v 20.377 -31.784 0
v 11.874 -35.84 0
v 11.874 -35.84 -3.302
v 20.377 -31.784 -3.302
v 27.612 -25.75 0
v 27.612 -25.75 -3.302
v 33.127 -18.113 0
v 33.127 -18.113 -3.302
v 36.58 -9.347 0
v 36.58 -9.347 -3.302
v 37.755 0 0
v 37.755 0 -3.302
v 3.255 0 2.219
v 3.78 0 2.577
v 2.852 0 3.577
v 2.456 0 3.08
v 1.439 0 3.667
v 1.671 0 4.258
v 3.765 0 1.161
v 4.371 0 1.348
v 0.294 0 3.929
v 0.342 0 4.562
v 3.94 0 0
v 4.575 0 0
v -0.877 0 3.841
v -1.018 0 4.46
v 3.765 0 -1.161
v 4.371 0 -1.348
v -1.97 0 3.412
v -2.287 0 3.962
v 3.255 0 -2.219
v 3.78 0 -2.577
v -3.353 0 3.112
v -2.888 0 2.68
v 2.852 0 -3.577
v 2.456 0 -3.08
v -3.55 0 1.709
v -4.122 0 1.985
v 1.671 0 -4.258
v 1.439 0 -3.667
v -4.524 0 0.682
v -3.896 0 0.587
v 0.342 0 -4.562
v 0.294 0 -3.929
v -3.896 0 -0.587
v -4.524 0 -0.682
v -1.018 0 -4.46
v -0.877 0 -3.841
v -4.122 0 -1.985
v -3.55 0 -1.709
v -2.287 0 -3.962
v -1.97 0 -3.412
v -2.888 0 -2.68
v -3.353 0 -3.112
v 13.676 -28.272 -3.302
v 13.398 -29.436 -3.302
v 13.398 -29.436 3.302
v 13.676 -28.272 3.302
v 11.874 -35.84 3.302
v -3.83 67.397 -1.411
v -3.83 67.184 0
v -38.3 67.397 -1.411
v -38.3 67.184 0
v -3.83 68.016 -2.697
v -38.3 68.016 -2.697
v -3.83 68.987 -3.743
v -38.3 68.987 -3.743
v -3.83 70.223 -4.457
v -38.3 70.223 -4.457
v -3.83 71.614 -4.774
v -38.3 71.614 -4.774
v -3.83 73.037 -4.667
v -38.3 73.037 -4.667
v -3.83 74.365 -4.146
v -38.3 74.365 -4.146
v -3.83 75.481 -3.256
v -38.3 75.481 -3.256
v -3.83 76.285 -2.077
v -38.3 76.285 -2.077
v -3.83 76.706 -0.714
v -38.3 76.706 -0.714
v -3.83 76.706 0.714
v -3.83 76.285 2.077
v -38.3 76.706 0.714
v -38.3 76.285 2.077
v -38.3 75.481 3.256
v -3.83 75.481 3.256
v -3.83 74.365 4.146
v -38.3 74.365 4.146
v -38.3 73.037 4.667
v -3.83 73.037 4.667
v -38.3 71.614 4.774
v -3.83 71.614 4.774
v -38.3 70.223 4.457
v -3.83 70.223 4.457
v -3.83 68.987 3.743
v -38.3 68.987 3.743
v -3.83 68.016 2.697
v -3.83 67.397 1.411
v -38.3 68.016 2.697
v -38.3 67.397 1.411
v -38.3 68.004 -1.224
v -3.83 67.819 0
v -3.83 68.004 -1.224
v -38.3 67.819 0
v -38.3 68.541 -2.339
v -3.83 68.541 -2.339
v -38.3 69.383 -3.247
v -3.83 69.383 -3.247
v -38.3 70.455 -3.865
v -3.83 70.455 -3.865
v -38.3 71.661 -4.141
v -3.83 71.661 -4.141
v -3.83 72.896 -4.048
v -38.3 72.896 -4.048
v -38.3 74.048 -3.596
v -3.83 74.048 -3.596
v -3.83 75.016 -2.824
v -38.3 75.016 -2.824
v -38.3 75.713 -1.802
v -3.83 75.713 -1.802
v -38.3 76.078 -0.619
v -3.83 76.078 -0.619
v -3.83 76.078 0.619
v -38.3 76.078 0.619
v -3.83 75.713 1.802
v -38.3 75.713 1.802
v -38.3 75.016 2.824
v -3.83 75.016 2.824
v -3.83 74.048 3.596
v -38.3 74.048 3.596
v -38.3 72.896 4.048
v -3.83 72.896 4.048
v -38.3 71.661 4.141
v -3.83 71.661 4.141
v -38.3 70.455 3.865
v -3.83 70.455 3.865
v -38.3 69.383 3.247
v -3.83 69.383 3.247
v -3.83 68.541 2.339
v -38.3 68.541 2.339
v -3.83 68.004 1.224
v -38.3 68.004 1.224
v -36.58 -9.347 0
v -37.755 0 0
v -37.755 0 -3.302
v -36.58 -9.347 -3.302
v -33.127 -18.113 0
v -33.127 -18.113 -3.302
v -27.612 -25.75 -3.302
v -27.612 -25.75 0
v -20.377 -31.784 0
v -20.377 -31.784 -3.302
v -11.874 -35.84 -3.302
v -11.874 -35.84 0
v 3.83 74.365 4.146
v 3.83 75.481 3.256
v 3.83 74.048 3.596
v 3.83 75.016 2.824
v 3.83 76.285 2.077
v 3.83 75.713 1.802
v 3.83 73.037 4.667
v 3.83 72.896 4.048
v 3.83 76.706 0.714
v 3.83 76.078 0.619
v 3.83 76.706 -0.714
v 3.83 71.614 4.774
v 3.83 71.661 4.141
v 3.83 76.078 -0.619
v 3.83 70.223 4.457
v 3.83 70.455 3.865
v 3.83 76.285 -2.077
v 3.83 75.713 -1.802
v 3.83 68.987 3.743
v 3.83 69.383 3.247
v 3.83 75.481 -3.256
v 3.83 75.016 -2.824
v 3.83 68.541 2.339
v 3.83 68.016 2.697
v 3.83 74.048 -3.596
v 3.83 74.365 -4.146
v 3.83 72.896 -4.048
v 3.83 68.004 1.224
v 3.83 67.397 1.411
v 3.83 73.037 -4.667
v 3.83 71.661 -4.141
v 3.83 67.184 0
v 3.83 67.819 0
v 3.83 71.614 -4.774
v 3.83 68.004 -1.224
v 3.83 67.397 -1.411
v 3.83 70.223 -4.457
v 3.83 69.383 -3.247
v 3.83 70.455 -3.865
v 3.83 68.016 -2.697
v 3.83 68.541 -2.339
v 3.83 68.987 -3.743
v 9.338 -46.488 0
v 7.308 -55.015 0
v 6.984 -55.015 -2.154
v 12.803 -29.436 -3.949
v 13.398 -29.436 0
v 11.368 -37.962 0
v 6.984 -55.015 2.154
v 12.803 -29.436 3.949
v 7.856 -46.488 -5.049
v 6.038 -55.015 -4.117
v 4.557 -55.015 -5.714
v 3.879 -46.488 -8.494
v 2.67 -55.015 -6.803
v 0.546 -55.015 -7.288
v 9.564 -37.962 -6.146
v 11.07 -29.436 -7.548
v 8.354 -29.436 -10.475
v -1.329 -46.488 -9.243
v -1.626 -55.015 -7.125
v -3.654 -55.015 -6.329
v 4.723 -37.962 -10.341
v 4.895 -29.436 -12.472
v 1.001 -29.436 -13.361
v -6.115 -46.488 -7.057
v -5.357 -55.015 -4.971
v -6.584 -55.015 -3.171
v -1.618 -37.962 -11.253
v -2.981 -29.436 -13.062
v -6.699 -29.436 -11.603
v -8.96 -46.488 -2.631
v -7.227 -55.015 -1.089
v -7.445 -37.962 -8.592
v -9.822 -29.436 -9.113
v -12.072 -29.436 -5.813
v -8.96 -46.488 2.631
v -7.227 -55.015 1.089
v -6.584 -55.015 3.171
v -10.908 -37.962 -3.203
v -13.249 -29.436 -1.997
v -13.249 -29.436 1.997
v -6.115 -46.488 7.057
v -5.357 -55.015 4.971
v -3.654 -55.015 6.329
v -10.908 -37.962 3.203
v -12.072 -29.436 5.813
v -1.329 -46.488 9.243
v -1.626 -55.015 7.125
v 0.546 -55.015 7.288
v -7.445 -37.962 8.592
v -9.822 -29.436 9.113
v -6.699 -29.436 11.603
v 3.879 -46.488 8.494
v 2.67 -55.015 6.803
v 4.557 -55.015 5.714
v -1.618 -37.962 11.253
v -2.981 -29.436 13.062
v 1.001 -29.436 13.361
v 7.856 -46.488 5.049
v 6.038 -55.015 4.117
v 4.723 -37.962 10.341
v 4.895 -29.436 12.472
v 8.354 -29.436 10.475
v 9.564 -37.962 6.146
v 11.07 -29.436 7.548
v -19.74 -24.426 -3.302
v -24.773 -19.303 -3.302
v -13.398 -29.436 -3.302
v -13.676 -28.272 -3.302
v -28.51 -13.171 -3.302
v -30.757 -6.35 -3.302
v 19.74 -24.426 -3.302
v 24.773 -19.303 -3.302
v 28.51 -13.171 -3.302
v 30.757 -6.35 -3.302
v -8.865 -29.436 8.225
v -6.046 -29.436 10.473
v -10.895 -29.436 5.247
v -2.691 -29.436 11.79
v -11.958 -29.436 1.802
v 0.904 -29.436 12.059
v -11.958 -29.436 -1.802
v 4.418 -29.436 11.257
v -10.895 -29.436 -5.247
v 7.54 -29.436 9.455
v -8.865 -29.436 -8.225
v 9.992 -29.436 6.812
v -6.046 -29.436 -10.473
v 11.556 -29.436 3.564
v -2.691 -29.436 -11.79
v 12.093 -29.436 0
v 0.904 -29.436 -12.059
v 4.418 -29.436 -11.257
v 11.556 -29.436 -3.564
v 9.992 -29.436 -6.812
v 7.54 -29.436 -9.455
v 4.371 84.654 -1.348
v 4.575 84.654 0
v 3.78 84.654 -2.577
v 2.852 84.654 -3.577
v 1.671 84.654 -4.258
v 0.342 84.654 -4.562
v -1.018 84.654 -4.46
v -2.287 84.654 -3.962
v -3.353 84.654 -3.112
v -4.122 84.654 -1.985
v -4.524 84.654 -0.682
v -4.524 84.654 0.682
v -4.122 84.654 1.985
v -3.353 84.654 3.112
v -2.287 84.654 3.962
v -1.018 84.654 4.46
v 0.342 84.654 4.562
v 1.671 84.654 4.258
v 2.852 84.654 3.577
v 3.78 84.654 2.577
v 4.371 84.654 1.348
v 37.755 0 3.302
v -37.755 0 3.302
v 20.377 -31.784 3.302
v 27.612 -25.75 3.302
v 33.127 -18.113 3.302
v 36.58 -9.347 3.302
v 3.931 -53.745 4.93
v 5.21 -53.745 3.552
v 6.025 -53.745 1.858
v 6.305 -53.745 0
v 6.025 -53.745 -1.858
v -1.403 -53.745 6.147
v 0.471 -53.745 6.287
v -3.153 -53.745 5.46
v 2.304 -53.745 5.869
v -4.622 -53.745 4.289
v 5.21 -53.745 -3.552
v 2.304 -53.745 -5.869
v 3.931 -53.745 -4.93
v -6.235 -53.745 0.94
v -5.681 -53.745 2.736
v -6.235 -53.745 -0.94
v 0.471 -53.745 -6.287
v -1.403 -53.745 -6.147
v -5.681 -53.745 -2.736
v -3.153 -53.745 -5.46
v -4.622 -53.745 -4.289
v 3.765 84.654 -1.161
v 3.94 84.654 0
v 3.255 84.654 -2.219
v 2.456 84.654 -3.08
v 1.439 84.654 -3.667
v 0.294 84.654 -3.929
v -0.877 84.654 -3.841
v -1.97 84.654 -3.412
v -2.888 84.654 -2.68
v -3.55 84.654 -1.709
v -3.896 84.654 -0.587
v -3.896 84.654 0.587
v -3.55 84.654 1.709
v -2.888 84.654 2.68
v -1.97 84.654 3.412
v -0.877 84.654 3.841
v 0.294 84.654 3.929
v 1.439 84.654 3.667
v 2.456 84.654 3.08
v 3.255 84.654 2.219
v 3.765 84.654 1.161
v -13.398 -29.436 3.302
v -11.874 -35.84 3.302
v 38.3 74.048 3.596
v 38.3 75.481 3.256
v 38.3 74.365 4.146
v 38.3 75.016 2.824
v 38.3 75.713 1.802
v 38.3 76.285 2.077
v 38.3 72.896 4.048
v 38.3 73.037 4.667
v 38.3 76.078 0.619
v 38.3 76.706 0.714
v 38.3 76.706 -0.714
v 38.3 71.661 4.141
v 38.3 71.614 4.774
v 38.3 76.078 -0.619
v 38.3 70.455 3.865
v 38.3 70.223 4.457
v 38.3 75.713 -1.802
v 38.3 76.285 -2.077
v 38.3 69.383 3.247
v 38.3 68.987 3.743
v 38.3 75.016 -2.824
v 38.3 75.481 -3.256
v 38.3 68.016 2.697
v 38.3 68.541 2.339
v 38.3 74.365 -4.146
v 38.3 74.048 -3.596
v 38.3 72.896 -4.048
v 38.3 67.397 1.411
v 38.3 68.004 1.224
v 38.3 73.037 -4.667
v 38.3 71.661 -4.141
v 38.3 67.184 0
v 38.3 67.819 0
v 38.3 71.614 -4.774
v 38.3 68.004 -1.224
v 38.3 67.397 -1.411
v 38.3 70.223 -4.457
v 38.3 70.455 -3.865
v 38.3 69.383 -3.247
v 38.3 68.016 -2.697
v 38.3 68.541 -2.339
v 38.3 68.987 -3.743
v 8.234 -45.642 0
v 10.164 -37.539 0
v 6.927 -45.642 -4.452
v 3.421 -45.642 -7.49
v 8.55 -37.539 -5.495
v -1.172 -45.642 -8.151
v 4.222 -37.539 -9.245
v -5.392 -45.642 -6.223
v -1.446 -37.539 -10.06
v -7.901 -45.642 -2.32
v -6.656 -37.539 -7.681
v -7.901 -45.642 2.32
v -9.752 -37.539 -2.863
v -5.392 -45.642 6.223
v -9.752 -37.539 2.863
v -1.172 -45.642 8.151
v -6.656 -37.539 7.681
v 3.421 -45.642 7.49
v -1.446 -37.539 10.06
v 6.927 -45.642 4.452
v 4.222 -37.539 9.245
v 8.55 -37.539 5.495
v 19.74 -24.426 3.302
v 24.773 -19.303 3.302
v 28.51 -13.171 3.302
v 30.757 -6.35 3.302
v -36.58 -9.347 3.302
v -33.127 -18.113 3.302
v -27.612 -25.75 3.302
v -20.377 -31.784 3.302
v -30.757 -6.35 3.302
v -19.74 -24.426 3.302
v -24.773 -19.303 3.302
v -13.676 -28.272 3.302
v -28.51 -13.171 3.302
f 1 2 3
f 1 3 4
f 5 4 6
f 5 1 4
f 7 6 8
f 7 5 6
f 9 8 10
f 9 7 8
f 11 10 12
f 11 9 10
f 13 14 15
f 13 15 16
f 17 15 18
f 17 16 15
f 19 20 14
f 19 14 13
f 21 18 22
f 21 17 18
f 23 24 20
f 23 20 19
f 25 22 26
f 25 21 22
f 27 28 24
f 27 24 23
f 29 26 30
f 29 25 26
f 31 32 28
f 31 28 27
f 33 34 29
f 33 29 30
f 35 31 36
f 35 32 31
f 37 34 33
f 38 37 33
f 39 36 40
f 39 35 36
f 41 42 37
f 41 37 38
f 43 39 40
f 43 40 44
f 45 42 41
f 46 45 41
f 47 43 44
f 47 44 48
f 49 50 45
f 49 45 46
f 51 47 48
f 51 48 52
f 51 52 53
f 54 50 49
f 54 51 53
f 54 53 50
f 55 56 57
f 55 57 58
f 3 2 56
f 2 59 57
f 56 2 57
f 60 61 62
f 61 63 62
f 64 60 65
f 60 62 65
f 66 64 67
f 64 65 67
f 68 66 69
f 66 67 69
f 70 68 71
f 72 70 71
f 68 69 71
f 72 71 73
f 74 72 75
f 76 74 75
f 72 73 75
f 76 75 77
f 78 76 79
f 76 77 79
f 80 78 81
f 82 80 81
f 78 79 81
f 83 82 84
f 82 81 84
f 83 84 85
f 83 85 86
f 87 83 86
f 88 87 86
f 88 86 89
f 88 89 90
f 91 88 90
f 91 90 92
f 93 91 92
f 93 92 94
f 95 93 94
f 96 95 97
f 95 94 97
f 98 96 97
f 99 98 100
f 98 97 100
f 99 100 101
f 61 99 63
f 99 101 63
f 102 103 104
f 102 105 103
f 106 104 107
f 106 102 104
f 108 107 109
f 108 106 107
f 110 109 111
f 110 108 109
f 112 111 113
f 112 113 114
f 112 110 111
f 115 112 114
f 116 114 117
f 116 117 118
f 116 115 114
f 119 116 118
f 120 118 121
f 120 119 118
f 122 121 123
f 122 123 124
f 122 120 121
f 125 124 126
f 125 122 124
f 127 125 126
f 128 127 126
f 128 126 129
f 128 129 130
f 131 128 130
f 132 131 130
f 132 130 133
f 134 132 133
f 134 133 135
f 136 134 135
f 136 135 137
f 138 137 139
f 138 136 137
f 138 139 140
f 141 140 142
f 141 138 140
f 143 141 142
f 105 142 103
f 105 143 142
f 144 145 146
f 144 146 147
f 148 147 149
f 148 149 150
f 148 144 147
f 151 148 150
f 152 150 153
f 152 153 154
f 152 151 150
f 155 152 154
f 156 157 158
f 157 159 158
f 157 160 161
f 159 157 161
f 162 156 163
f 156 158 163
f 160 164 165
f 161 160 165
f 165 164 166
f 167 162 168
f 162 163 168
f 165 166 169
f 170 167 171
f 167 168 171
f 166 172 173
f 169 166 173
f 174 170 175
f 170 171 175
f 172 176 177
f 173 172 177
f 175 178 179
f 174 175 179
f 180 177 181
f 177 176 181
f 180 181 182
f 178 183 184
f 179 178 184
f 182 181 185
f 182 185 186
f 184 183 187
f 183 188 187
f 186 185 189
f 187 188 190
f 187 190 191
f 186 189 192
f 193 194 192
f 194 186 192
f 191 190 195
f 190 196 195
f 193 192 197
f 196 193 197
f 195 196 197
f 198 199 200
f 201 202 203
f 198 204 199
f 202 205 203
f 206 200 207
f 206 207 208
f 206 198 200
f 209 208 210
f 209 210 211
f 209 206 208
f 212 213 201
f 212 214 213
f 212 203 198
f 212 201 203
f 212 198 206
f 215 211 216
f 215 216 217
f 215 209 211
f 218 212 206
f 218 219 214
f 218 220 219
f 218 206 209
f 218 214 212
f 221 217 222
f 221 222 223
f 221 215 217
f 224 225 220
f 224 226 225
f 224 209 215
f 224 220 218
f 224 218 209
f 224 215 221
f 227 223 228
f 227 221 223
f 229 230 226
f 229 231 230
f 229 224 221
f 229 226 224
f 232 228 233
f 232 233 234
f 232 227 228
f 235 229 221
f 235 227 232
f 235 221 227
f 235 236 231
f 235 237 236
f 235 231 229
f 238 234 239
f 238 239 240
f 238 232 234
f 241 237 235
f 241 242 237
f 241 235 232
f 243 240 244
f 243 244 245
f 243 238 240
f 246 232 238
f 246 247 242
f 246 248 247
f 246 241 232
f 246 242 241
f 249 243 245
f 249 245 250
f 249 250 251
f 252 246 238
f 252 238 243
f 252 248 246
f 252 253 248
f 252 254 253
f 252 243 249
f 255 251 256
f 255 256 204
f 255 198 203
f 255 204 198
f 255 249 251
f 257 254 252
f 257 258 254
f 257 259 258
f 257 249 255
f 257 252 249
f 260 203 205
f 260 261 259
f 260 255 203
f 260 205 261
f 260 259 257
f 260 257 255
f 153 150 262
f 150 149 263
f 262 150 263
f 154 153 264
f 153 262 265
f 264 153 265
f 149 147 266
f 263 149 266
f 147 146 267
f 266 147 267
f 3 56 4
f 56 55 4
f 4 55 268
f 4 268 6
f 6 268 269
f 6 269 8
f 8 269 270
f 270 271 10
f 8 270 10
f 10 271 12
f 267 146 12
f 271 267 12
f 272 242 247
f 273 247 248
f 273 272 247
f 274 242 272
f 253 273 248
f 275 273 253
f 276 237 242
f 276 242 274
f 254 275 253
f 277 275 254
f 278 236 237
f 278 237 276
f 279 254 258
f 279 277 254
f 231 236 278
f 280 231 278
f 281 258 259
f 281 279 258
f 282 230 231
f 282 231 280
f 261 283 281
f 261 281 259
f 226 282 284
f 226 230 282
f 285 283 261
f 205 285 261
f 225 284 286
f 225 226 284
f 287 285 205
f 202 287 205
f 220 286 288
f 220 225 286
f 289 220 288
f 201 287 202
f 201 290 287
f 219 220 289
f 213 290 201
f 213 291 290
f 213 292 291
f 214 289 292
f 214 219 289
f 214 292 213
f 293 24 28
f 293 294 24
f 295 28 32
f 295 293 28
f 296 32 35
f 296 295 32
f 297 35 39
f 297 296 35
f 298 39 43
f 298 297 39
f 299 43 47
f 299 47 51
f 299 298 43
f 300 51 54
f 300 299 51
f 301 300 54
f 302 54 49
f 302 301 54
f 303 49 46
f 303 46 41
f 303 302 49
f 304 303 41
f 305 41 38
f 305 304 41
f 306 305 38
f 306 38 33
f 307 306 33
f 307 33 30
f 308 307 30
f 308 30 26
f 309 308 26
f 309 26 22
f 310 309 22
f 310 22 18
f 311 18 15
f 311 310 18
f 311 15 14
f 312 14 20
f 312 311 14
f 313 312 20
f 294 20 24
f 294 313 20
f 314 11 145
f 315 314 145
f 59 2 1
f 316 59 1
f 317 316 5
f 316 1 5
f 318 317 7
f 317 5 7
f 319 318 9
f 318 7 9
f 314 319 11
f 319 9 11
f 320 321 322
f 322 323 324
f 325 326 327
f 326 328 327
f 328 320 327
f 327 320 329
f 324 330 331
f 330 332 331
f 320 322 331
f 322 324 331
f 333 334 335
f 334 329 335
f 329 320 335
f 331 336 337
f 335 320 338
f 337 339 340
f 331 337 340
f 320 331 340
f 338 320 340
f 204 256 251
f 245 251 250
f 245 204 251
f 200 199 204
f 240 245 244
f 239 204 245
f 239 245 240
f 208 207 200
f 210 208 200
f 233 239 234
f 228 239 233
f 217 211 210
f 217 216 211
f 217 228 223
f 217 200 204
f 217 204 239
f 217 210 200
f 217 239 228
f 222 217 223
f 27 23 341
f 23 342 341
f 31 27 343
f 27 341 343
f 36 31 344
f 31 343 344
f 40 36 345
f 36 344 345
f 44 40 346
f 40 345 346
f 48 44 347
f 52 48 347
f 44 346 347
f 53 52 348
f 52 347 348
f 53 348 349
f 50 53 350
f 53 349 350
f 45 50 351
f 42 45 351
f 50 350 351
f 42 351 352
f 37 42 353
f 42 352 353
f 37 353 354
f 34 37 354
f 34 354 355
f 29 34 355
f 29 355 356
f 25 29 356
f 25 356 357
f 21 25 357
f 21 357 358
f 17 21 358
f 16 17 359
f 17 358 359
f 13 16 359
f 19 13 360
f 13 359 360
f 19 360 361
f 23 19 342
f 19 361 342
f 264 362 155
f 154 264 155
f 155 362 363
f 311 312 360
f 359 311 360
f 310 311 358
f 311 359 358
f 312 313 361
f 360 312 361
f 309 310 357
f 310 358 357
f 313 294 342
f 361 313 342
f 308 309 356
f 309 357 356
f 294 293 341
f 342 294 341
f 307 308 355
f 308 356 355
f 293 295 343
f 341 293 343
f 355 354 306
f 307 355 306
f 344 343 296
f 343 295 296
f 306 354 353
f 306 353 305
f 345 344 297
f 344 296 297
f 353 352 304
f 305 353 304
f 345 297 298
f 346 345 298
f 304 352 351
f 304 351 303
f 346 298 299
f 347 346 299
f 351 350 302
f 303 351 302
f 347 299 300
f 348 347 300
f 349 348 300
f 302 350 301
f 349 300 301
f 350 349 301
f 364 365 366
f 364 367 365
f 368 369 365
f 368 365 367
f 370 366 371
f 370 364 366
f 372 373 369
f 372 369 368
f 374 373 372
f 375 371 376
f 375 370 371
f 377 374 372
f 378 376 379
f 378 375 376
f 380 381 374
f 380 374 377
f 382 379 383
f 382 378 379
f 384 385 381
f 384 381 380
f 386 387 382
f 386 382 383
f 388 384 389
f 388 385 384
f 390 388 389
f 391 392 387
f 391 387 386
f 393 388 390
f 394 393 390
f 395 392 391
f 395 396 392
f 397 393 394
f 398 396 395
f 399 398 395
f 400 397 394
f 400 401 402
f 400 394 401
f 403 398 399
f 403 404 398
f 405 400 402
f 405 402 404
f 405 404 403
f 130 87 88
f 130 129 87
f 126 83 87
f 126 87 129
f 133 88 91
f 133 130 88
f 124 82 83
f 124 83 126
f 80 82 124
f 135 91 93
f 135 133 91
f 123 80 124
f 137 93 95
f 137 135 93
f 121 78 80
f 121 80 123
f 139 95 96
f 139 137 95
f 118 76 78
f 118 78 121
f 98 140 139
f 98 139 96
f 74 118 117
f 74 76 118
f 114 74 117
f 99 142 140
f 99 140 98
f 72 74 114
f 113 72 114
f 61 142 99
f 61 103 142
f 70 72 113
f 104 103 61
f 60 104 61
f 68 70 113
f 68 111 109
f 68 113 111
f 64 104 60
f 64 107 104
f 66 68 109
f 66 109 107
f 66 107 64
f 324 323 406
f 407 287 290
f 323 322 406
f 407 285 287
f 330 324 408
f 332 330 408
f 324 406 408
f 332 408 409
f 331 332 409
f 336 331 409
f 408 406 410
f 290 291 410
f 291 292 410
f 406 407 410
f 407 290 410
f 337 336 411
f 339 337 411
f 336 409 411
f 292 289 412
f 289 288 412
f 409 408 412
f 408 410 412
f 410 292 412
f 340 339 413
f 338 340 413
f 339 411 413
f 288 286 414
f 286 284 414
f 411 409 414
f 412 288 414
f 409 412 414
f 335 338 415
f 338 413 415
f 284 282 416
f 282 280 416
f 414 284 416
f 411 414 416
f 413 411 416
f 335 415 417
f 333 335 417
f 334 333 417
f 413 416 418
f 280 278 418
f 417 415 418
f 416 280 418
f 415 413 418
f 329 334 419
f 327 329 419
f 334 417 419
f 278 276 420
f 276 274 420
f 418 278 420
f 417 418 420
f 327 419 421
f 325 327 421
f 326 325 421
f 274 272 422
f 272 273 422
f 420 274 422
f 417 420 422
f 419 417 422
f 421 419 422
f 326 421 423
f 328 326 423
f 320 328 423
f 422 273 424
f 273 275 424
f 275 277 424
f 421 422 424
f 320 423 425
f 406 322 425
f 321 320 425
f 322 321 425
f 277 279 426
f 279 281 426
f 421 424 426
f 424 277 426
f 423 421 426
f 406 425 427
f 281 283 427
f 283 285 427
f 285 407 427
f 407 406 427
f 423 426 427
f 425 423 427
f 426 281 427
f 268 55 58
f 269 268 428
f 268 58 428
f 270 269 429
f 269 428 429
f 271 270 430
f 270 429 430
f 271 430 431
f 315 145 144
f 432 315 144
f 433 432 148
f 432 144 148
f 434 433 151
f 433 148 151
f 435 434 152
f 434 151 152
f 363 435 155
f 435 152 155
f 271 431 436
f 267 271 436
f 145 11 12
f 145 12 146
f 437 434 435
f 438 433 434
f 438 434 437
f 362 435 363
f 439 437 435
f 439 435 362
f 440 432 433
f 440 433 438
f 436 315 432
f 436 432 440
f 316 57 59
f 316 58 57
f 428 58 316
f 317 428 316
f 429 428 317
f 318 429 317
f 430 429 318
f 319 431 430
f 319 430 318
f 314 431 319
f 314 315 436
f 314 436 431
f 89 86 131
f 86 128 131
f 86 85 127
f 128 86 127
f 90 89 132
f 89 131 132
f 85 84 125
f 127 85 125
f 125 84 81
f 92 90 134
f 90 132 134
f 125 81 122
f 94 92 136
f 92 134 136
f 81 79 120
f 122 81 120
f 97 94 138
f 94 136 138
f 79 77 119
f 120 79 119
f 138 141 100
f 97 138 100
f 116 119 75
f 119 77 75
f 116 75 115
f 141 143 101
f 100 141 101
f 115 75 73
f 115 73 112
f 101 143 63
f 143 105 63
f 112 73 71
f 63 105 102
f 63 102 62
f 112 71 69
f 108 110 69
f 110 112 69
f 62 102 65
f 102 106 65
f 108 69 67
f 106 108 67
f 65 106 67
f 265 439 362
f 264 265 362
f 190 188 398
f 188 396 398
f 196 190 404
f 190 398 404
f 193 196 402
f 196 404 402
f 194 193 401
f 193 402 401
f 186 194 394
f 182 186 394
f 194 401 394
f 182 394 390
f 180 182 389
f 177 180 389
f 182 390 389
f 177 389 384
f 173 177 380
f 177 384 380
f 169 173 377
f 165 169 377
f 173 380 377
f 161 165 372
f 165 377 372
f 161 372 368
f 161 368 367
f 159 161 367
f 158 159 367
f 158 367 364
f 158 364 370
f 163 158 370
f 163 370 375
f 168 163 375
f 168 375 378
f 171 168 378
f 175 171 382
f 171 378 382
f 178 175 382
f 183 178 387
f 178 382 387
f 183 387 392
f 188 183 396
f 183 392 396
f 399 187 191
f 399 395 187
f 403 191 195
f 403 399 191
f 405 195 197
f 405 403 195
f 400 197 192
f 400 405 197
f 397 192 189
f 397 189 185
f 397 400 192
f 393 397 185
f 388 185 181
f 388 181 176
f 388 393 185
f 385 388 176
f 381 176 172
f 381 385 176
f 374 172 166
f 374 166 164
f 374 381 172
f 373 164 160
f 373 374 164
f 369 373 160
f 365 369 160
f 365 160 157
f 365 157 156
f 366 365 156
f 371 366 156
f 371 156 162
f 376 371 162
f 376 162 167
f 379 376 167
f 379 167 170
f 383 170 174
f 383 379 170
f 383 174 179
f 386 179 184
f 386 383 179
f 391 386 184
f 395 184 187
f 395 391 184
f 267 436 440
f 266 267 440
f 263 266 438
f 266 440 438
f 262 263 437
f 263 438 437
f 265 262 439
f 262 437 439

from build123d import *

# Parameters (mm, degrees)
F0_W      = 4.5747002587
F0_H      = 84.6535563469
F2_DEPTH  = 3.302
F3_W      = 34.4697830733
F3_H      = 4.7874748707
F7_DEPTH  = 25.4
F8_T      = -1.27
F10_DEPTH = 25.4
F11_T     = -0.635
F11_2_T   = -0.635
F11_3_T   = -0.635


with BuildPart() as f1:
    # F0 (on Top) → F1 (revolve)
    with BuildSketch(Plane.XY):
        with Locations((2.2873501293, 42.3267781734)):
            Rectangle(F0_W, F0_H)
    revolve(axis=Axis((0, 42.3267781734, 0), (0, 1, 0)))

    # F11
    f11_openings = [f1.faces().sort_by_distance(p)[0] for p in [
        (0, 84.653556, 0),
        (0, 0, 0),
    ]]
    offset(amount=F11_T, openings=f11_openings)


with BuildPart() as f1b:
    # F0 (on Top) → F1, piece 2 (revolve)
    with BuildSketch(Plane.XY):
        with BuildLine():
            ThreePointArc((11.8736668494, -35.8397841513), (6.0136042551, -37.2734577994), (0, -37.7554511622))
            Line((0, -37.7554511622), (0, -55.0146475434))
            Line((0, -55.0146475434), (7.3082223535, -55.0146475434))
            Line((7.3082223535, -55.0146475434), (11.8736668494, -35.8397841513))
        make_face()
        with BuildLine():
            Line((13.3984060958, -29.4358804822), (0, -29.4358804822))
            Line((0, -29.4358804822), (0, -37.7554511622))
            ThreePointArc((0, -37.7554511622), (6.0136042551, -37.2734577994), (11.8736668494, -35.8397841513))
            Line((11.8736668494, -35.8397841513), (13.3984060958, -29.4358804822))
        make_face()
    revolve(axis=Axis((0, 42.3267781734, 0), (0, 1, 0)))

    # F8
    f8_openings = [f1b.faces().sort_by_distance(p)[0] for p in [
        (0, -29.43588, 0),
    ]]
    offset(amount=F8_T, openings=f8_openings)


with BuildPart() as f2:
    # F0 (on Top) → F2 (new body, symmetric)
    with BuildSketch(Plane.XY):
        with BuildLine():
            Line((4.5747002587, 0), (0, 0))
            Line((0, 0), (0, -29.4358804822))
            Line((0, -29.4358804822), (13.3984060958, -29.4358804822))
            Line((13.3984060958, -29.4358804822), (11.8736668494, -35.8397841513))
            ThreePointArc((11.8736668494, -35.8397841513), (30.6085751164, -22.1040544201), (37.7554511622, 0))
            Line((37.7554511622, 0), (4.5747002587, 0))
        make_face()
        with BuildLine():
            Line((0, -29.4358804822), (0, 0))
            Line((0, 0), (-37.7554511622, 0))
            ThreePointArc((-37.7554511622, 0), (-26.6971355436, -26.6971355436), (0, -37.7554511622))
            Line((0, -37.7554511622), (0, -29.4358804822))
        make_face()
        with BuildLine():
            Line((13.3984060958, -29.4358804822), (0, -29.4358804822))
            Line((0, -29.4358804822), (0, -37.7554511622))
            ThreePointArc((0, -37.7554511622), (6.0136042551, -37.2734577994), (11.8736668494, -35.8397841513))
            Line((11.8736668494, -35.8397841513), (13.3984060958, -29.4358804822))
        make_face()
    extrude(amount=F2_DEPTH, both=True)

    # F6 (on face) → F7 (cut)
    with BuildSketch(Plane.XY.offset(3.302)):
        with BuildLine():
            ThreePointArc((-30.7567857309, -6.3499999233), (0, -31.405451239), (30.7567857309, -6.3499999233))
            Line((30.7567857309, -6.3499999233), (0, -6.3499999233))
            Line((0, -6.3499999233), (-30.7567857309, -6.3499999233))
        make_face()
    extrude(amount=-F7_DEPTH, mode=Mode.SUBTRACT)

    # F9 (on face) → F10 (cut)
    with BuildSketch(Plane.XY.offset(3.302)):
        Polygon((7.3082223535, -55.0146475434), (13.3984060958, -29.4358804822), (16.3305439812, -17.1209036056), (-16.3305439812, -17.1209036056), (-13.3984060958, -29.4358804822), (-7.3082223535, -55.0146475434), align=None)
    extrude(amount=-F10_DEPTH, mode=Mode.SUBTRACT)


with BuildPart() as f4:
    # F3 (on Top) → F4 (revolve)
    with BuildSketch(Plane.XY):
        with Locations((21.0648664506, 69.5778951049)):
            Rectangle(F3_W, F3_H)
    revolve(axis=Axis((21.0648664506, 71.9716325402, 0), (1, 0, 0)))


with BuildPart() as f5_1:
    # F5: instance of F4
    add(f4.part.mirror(Plane.YZ))

    # F11#3
    f11_3_openings = [f5_1.faces().sort_by_distance(p)[0] for p in [
        (-3.829975, 71.971633, 0),
        (-38.299758, 71.971633, 0),
    ]]
    offset(amount=F11_3_T, openings=f11_3_openings)


with BuildPart() as f4_1:
    add(f4.part)

    # F11#2
    f11_2_openings = [f4_1.faces().sort_by_distance(p)[0] for p in [
        (38.299758, 71.971633, 0),
        (3.829975, 71.971633, 0),
    ]]
    offset(amount=F11_2_T, openings=f11_2_openings)


solid = Compound([f1.part, f1b.part, f2.part, f5_1.part, f4_1.part])
